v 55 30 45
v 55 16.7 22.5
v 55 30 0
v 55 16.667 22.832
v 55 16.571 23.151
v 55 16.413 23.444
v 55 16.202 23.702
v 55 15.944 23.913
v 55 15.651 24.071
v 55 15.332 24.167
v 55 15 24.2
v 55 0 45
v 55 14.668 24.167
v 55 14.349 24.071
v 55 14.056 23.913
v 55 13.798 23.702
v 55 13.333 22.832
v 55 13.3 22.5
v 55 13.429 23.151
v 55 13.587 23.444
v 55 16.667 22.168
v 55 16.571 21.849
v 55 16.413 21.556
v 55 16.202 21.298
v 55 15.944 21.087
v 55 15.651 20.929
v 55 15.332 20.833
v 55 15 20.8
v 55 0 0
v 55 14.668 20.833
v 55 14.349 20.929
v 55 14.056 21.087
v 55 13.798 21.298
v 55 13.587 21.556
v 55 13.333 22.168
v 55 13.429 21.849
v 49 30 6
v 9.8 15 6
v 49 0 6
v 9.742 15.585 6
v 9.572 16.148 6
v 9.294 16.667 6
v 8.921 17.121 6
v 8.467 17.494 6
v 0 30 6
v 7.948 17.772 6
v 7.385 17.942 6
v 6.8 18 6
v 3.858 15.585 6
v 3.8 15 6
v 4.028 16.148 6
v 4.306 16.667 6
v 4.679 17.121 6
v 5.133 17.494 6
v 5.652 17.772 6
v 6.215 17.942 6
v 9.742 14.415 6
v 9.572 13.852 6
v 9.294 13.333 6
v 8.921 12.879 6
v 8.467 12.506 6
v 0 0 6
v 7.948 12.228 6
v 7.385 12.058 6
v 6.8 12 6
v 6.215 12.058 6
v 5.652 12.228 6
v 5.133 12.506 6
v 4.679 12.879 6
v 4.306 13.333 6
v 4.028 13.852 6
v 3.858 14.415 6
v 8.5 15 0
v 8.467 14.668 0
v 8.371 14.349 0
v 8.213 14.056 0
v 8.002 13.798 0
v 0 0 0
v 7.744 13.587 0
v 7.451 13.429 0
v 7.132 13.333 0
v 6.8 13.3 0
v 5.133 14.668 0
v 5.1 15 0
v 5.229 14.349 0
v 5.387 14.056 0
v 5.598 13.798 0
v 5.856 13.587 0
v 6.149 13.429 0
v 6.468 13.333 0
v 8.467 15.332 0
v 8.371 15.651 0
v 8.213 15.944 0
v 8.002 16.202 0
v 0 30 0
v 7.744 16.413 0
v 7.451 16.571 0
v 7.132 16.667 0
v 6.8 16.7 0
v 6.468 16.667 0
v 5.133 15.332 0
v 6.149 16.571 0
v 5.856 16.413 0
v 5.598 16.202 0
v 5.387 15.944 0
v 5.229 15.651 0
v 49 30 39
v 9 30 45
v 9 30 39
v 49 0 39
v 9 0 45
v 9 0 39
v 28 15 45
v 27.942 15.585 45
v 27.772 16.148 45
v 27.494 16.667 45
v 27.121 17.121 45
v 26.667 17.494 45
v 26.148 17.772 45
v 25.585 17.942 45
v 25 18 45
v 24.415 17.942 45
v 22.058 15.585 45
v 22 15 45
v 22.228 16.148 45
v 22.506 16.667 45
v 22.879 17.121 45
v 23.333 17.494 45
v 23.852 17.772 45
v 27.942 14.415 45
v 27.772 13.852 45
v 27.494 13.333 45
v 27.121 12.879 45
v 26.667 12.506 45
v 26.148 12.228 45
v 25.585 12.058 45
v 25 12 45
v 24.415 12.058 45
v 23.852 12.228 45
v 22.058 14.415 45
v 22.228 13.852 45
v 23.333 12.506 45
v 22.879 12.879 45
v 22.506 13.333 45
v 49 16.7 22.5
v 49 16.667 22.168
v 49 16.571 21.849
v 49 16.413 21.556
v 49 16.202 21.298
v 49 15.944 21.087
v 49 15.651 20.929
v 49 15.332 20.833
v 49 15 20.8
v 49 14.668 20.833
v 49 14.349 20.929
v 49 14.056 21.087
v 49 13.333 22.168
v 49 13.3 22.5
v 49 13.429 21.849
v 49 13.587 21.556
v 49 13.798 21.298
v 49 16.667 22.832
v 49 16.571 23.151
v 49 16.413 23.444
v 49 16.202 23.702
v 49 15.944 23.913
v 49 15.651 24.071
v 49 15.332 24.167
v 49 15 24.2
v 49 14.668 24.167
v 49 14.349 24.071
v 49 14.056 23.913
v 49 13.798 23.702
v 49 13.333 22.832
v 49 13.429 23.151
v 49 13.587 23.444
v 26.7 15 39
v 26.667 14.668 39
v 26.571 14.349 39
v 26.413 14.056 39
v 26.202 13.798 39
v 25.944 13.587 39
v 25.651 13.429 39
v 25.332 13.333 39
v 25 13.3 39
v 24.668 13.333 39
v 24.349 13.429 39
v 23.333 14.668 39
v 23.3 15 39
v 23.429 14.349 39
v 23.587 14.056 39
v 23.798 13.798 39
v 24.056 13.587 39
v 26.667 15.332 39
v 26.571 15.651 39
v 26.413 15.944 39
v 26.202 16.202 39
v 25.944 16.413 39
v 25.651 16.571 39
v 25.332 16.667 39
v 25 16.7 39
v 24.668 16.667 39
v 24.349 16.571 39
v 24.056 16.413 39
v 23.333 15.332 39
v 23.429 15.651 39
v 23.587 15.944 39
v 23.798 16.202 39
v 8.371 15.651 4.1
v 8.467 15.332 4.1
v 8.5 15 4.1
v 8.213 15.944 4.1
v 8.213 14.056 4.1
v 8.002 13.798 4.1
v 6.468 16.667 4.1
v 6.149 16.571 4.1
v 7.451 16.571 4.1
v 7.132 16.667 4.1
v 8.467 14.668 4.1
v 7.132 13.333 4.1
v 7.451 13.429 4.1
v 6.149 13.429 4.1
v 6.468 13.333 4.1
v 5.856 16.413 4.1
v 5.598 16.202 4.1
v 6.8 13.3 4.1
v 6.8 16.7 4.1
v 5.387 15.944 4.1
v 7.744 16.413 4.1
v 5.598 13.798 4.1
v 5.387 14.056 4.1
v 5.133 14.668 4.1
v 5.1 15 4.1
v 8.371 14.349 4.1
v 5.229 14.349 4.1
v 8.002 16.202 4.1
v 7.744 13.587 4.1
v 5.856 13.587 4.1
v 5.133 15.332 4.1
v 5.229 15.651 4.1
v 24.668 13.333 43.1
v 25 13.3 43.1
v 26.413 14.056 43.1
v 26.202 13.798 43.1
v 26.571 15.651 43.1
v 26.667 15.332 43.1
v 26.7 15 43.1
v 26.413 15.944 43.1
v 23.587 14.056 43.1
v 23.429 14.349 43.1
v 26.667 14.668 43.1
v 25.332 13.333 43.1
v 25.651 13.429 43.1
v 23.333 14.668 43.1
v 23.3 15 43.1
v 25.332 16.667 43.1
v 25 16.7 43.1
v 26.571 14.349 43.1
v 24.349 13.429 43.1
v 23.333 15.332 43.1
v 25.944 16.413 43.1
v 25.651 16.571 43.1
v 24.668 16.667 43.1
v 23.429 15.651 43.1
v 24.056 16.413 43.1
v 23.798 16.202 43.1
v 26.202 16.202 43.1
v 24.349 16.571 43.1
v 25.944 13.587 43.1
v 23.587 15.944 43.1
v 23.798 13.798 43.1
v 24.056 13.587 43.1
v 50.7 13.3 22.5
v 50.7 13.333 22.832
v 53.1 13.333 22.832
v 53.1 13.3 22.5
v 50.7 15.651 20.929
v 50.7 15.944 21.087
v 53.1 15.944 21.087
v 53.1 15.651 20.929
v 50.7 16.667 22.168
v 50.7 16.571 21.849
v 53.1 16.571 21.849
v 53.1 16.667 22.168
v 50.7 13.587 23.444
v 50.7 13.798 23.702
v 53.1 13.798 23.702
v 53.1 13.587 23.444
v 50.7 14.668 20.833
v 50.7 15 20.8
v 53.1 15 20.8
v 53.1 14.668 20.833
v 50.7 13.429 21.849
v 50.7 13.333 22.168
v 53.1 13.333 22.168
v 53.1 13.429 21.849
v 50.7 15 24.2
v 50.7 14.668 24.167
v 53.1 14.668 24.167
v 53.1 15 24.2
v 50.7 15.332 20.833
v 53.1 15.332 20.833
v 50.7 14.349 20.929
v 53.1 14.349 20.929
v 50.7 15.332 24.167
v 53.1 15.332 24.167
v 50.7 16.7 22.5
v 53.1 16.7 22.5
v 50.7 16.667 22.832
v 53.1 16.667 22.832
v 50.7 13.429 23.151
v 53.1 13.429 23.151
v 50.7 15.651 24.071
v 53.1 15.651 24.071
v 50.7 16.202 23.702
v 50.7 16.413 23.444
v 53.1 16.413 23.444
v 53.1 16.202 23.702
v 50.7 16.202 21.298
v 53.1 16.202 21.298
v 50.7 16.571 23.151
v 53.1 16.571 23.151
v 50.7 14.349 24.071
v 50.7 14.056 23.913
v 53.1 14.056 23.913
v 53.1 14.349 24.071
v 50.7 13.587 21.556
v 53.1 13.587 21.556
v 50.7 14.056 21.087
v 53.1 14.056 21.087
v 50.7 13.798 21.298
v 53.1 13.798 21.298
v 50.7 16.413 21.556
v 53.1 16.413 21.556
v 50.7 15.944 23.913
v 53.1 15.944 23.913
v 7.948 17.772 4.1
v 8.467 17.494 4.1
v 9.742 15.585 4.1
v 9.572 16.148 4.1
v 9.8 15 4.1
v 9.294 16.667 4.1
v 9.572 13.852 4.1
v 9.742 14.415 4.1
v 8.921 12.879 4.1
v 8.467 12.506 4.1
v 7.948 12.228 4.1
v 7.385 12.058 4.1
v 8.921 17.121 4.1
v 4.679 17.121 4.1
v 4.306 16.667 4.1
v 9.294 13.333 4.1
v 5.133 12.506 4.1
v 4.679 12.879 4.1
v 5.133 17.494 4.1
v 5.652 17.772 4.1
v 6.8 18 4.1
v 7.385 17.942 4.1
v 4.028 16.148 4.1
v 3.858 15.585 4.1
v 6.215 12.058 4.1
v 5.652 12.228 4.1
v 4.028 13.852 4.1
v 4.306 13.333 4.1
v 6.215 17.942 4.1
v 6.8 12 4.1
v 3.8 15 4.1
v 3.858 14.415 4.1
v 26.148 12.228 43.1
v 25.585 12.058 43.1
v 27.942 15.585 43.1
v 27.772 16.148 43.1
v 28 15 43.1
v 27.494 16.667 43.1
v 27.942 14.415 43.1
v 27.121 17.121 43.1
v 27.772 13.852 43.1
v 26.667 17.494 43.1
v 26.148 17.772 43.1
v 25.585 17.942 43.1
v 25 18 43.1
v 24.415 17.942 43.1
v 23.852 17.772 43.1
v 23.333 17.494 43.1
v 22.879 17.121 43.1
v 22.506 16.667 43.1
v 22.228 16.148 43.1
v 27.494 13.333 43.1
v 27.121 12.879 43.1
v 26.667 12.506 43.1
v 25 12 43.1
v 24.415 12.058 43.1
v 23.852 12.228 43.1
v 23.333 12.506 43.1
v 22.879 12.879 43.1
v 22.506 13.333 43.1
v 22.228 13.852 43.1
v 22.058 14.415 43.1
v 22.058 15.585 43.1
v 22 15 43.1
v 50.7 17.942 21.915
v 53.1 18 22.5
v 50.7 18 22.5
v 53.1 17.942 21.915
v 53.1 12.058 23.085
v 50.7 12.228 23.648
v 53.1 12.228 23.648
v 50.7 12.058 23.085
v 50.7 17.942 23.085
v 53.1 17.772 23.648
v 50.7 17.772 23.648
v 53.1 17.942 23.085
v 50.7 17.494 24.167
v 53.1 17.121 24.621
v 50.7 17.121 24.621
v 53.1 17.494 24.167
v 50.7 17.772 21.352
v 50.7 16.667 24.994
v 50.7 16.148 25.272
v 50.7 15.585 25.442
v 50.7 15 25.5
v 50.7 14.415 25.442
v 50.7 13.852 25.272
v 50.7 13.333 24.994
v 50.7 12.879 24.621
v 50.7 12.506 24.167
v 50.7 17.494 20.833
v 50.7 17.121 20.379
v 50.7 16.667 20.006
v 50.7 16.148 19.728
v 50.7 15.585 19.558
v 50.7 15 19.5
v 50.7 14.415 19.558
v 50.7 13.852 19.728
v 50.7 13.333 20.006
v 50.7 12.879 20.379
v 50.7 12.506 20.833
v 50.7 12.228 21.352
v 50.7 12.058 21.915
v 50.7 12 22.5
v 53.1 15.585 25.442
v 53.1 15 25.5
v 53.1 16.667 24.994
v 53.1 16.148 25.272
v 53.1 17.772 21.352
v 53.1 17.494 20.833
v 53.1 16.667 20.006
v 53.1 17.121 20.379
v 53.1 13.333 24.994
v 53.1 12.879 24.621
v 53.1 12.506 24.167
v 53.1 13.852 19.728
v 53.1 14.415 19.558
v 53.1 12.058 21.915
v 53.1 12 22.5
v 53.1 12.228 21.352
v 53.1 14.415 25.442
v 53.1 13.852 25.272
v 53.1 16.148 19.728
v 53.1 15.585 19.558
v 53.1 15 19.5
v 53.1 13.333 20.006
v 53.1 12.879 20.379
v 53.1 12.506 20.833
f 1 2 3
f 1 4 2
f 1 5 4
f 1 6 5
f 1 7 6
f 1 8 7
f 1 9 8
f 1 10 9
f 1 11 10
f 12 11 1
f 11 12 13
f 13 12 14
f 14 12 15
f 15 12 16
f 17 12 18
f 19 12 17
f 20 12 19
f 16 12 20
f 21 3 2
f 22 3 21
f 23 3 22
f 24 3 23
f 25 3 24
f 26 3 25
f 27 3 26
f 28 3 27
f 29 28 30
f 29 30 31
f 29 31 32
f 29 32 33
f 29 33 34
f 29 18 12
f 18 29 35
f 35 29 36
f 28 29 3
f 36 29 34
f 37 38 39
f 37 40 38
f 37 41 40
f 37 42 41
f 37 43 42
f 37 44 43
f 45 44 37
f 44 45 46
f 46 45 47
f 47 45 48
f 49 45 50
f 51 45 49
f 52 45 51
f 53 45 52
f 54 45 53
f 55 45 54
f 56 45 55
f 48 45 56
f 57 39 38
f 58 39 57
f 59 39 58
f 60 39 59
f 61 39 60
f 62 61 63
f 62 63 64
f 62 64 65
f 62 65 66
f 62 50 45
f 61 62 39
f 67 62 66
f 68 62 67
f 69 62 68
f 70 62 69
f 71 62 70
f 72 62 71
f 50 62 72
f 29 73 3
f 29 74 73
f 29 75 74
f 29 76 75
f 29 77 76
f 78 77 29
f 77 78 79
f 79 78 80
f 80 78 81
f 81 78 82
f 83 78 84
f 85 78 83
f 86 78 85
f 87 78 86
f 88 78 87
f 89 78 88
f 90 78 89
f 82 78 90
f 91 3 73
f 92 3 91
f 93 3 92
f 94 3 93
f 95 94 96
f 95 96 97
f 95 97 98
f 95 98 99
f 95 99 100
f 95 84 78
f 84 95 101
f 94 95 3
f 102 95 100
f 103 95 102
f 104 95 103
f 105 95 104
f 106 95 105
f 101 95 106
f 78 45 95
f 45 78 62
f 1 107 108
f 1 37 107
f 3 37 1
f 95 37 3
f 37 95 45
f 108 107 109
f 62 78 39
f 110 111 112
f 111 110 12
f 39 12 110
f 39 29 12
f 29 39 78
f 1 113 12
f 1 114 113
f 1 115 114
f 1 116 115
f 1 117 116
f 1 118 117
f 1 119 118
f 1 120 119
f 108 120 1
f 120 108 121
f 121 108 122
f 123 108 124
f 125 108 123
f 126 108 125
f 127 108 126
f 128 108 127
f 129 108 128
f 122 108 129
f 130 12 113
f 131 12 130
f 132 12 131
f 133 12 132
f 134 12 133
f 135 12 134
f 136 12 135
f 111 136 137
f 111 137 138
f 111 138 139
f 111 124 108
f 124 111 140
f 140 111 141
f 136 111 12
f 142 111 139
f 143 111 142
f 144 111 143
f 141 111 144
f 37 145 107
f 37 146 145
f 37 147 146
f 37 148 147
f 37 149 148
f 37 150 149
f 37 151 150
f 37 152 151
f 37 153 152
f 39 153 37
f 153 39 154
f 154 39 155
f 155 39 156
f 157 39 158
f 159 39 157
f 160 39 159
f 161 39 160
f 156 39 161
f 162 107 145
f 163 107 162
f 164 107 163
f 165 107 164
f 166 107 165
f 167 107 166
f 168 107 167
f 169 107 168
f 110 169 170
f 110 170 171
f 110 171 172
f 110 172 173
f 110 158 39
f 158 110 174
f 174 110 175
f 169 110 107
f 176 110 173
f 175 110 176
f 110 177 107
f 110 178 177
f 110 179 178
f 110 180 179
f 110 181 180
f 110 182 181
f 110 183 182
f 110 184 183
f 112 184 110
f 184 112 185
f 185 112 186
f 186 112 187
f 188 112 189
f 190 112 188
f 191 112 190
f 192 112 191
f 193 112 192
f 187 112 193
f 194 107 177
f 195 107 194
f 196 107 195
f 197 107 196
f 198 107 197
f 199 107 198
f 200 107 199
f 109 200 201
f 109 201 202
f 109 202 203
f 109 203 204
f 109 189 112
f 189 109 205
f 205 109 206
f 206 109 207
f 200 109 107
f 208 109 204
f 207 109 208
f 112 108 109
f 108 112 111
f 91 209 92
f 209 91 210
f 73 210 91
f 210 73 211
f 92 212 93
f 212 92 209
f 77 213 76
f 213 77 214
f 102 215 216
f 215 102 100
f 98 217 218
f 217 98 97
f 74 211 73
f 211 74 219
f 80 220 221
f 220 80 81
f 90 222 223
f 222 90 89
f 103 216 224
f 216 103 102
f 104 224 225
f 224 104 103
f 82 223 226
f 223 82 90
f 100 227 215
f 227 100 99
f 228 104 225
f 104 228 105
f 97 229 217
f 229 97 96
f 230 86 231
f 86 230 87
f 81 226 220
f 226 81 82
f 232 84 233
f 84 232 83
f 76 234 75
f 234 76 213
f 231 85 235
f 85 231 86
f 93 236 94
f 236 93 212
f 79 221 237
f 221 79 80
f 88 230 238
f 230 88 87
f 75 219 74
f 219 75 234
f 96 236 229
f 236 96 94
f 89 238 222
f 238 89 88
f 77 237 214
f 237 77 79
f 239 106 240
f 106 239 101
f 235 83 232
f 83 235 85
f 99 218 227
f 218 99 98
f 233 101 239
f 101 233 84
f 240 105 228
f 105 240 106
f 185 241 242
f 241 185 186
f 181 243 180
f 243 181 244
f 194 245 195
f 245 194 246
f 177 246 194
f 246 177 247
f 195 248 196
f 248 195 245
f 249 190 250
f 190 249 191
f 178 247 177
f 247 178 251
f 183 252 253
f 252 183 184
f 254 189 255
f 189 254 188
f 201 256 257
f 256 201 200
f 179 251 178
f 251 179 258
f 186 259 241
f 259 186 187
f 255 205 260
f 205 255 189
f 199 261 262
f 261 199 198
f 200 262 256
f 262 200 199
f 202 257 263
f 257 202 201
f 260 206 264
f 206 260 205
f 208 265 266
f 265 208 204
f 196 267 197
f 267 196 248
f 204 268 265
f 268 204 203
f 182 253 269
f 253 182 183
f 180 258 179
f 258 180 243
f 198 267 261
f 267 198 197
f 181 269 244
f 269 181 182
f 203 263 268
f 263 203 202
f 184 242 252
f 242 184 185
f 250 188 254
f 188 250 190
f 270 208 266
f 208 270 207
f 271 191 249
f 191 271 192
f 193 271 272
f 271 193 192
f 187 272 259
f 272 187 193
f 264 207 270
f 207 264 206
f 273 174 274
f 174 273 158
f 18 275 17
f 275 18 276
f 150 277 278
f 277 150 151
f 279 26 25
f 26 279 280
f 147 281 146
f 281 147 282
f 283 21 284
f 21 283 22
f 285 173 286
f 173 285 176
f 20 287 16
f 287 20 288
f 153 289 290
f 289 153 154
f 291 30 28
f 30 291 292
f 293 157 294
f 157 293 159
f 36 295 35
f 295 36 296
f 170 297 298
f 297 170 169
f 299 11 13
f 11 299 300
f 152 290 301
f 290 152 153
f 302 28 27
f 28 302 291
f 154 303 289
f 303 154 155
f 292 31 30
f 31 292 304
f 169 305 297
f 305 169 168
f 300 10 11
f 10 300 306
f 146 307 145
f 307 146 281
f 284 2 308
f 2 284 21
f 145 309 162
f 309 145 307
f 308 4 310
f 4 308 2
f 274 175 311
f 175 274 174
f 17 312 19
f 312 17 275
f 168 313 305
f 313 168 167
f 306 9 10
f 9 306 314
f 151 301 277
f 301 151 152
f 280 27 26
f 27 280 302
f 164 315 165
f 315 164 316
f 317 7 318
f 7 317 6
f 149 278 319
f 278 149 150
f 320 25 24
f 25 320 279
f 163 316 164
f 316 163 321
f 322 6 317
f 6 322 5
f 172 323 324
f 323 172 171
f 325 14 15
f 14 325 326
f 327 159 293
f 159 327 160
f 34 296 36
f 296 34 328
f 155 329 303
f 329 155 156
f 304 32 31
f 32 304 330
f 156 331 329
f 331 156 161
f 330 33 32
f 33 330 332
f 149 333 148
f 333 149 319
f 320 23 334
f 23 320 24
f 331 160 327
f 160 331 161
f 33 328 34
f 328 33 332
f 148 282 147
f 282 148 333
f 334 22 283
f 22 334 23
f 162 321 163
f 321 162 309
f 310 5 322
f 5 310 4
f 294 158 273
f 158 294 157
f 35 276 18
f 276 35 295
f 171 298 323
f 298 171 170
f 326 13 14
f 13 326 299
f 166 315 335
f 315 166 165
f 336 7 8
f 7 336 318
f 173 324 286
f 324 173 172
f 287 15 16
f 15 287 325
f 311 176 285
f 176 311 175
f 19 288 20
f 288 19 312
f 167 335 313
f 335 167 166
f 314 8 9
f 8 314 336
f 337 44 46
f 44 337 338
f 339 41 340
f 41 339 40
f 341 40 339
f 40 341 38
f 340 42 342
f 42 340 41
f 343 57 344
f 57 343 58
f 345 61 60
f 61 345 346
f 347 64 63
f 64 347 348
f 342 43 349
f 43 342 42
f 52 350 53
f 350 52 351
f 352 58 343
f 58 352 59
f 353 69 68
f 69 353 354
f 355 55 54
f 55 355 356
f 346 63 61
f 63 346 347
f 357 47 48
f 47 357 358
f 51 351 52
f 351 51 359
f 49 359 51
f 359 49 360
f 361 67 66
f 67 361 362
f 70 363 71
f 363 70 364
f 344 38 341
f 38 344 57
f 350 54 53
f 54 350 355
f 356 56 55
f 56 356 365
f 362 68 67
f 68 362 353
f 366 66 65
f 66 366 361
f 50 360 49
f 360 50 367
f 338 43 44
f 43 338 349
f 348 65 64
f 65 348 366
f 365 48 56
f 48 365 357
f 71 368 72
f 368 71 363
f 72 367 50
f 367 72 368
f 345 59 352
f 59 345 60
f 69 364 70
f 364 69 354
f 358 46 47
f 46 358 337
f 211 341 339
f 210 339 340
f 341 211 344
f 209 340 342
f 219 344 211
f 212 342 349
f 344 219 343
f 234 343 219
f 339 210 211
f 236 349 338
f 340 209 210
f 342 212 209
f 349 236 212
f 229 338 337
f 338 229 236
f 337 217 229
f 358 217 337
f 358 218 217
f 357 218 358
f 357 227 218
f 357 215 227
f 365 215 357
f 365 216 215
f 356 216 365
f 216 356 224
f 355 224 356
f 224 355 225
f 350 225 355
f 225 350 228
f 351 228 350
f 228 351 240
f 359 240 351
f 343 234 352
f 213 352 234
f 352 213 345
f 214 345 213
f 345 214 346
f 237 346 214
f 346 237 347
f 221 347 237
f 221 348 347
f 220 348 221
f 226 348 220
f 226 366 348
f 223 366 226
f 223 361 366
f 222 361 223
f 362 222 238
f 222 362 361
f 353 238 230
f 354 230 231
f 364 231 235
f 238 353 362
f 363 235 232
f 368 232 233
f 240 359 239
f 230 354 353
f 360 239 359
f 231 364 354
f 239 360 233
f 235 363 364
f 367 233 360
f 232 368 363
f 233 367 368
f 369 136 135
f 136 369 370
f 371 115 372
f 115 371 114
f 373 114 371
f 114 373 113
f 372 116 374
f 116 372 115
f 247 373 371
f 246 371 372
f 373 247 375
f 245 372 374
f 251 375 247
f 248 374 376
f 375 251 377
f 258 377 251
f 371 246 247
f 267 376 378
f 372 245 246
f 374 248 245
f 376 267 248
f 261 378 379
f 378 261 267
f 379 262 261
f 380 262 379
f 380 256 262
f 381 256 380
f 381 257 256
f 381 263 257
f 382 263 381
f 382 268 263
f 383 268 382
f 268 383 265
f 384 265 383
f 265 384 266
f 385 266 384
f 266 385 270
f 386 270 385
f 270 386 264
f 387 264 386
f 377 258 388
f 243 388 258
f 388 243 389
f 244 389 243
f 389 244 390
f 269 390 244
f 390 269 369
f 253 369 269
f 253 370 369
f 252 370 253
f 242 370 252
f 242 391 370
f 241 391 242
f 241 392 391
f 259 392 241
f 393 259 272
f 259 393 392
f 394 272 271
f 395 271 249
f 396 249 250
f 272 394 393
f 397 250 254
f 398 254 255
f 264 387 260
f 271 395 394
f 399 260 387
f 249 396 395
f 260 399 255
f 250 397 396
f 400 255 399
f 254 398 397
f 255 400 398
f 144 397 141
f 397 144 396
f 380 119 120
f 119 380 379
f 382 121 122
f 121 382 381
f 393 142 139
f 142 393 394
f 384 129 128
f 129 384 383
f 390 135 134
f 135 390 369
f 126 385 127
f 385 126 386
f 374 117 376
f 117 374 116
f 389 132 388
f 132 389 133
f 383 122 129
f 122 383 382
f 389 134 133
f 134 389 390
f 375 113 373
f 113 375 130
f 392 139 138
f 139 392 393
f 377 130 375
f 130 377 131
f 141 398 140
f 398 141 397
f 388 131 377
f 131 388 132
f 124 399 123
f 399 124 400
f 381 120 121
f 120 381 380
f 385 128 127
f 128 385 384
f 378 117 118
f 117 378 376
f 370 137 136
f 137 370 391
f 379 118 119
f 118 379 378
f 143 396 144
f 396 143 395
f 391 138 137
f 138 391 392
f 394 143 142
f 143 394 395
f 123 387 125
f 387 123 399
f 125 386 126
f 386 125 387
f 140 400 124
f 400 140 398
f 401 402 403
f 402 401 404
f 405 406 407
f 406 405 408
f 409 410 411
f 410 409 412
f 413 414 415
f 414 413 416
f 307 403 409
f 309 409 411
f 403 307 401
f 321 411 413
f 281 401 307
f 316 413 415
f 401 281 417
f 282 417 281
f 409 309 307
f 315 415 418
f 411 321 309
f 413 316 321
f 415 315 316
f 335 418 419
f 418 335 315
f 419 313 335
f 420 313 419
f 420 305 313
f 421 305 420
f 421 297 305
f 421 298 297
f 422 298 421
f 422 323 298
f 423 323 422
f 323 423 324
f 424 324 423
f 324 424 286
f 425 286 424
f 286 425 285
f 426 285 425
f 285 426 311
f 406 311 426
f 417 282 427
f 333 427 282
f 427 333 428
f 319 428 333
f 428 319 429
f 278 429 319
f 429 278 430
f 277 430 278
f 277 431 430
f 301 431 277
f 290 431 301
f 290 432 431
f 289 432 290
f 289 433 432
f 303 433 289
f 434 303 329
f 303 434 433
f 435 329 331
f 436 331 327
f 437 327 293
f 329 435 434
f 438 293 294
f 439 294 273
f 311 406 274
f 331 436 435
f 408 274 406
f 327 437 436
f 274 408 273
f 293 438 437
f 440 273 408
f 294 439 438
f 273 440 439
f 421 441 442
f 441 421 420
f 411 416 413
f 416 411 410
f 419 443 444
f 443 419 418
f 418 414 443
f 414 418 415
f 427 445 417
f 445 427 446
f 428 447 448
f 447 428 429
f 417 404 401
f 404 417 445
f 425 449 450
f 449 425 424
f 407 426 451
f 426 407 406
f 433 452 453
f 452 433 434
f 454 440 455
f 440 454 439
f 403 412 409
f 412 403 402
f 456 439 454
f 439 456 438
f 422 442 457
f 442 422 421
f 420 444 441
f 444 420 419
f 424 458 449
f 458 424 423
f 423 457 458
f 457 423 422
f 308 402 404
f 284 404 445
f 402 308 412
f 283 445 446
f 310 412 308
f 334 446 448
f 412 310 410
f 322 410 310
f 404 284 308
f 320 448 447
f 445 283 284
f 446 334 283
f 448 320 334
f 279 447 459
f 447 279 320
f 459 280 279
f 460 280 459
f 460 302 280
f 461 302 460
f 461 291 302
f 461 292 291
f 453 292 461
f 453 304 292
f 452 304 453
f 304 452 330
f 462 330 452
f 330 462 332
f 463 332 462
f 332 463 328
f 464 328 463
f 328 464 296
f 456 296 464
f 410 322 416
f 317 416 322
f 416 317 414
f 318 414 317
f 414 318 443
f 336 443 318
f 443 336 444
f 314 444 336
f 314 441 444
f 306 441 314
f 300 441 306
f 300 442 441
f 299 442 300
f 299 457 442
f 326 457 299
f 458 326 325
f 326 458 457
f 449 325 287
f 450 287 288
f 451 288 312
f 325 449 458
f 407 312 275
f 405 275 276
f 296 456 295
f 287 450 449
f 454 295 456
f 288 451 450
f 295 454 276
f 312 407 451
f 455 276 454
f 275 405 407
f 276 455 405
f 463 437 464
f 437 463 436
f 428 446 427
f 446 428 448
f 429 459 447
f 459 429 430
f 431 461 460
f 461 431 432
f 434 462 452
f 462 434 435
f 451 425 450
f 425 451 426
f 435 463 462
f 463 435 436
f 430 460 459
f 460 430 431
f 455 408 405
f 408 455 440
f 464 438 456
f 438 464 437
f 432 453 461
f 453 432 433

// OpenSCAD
$fn = 32;

// ----------------------------------------------------------------------
// Z-bracket: 55 x 30 x 45 mm
// ----------------------------------------------------------------------

// --- parameters (mm) ---
foot_len = 55;            // lower foot length, X
top_len = 40;             // upper foot length, X
depth = 30;               // bracket width, Y
step_h = 45;              // overall rise, Z
plate_t = 6;              // plate thickness
hole_d = 3.4;             // clearance for M3
cb_d = 6;                 // counterbore diameter
cb_h = 1.9;               // counterbore depth

module hole_z(px, py, z0) {
  translate([px, py, z0 - 2.5]) cylinder(h = plate_t + 5, d = hole_d);
}
module hole_x(py, pz) {
  translate([-2.5, py, pz]) rotate([0, 90, 0]) cylinder(h = plate_t + 5, d = hole_d);
}
module cb_z(px, py, top_z) {
  translate([px, py, top_z - cb_h]) cylinder(h = cb_h + 0.5, d = cb_d);
}
module cb_x(py, pz) {
  translate([plate_t - cb_h, py, pz]) rotate([0, -90, 0]) cylinder(h = cb_h + 0.5, d = cb_d);
}

difference() {
  union() {
    cube([foot_len, depth, plate_t]);
    /* web, overlapping the lower foot */
    translate([foot_len - plate_t, 0, 0]) cube([plate_t, depth, step_h]);
    /* upper foot, sunk into the web */
    translate([foot_len - plate_t - top_len, 0, step_h - plate_t]) cube([top_len + plate_t, depth, plate_t]);
  }
  hole_z(6.8, 15, 0);
  translate([foot_len - plate_t - 24, 0, 0]) hole_z(0, 15, step_h - plate_t);
  translate([foot_len - plate_t, 0, 0]) hole_x(15, 22.5);
  cb_z(6.8, 15, plate_t);
  translate([foot_len - plate_t - 24, 0, 0]) cb_z(0, 15, step_h);
  translate([foot_len - plate_t, 0, 0]) cb_x(15, 22.5);
}
